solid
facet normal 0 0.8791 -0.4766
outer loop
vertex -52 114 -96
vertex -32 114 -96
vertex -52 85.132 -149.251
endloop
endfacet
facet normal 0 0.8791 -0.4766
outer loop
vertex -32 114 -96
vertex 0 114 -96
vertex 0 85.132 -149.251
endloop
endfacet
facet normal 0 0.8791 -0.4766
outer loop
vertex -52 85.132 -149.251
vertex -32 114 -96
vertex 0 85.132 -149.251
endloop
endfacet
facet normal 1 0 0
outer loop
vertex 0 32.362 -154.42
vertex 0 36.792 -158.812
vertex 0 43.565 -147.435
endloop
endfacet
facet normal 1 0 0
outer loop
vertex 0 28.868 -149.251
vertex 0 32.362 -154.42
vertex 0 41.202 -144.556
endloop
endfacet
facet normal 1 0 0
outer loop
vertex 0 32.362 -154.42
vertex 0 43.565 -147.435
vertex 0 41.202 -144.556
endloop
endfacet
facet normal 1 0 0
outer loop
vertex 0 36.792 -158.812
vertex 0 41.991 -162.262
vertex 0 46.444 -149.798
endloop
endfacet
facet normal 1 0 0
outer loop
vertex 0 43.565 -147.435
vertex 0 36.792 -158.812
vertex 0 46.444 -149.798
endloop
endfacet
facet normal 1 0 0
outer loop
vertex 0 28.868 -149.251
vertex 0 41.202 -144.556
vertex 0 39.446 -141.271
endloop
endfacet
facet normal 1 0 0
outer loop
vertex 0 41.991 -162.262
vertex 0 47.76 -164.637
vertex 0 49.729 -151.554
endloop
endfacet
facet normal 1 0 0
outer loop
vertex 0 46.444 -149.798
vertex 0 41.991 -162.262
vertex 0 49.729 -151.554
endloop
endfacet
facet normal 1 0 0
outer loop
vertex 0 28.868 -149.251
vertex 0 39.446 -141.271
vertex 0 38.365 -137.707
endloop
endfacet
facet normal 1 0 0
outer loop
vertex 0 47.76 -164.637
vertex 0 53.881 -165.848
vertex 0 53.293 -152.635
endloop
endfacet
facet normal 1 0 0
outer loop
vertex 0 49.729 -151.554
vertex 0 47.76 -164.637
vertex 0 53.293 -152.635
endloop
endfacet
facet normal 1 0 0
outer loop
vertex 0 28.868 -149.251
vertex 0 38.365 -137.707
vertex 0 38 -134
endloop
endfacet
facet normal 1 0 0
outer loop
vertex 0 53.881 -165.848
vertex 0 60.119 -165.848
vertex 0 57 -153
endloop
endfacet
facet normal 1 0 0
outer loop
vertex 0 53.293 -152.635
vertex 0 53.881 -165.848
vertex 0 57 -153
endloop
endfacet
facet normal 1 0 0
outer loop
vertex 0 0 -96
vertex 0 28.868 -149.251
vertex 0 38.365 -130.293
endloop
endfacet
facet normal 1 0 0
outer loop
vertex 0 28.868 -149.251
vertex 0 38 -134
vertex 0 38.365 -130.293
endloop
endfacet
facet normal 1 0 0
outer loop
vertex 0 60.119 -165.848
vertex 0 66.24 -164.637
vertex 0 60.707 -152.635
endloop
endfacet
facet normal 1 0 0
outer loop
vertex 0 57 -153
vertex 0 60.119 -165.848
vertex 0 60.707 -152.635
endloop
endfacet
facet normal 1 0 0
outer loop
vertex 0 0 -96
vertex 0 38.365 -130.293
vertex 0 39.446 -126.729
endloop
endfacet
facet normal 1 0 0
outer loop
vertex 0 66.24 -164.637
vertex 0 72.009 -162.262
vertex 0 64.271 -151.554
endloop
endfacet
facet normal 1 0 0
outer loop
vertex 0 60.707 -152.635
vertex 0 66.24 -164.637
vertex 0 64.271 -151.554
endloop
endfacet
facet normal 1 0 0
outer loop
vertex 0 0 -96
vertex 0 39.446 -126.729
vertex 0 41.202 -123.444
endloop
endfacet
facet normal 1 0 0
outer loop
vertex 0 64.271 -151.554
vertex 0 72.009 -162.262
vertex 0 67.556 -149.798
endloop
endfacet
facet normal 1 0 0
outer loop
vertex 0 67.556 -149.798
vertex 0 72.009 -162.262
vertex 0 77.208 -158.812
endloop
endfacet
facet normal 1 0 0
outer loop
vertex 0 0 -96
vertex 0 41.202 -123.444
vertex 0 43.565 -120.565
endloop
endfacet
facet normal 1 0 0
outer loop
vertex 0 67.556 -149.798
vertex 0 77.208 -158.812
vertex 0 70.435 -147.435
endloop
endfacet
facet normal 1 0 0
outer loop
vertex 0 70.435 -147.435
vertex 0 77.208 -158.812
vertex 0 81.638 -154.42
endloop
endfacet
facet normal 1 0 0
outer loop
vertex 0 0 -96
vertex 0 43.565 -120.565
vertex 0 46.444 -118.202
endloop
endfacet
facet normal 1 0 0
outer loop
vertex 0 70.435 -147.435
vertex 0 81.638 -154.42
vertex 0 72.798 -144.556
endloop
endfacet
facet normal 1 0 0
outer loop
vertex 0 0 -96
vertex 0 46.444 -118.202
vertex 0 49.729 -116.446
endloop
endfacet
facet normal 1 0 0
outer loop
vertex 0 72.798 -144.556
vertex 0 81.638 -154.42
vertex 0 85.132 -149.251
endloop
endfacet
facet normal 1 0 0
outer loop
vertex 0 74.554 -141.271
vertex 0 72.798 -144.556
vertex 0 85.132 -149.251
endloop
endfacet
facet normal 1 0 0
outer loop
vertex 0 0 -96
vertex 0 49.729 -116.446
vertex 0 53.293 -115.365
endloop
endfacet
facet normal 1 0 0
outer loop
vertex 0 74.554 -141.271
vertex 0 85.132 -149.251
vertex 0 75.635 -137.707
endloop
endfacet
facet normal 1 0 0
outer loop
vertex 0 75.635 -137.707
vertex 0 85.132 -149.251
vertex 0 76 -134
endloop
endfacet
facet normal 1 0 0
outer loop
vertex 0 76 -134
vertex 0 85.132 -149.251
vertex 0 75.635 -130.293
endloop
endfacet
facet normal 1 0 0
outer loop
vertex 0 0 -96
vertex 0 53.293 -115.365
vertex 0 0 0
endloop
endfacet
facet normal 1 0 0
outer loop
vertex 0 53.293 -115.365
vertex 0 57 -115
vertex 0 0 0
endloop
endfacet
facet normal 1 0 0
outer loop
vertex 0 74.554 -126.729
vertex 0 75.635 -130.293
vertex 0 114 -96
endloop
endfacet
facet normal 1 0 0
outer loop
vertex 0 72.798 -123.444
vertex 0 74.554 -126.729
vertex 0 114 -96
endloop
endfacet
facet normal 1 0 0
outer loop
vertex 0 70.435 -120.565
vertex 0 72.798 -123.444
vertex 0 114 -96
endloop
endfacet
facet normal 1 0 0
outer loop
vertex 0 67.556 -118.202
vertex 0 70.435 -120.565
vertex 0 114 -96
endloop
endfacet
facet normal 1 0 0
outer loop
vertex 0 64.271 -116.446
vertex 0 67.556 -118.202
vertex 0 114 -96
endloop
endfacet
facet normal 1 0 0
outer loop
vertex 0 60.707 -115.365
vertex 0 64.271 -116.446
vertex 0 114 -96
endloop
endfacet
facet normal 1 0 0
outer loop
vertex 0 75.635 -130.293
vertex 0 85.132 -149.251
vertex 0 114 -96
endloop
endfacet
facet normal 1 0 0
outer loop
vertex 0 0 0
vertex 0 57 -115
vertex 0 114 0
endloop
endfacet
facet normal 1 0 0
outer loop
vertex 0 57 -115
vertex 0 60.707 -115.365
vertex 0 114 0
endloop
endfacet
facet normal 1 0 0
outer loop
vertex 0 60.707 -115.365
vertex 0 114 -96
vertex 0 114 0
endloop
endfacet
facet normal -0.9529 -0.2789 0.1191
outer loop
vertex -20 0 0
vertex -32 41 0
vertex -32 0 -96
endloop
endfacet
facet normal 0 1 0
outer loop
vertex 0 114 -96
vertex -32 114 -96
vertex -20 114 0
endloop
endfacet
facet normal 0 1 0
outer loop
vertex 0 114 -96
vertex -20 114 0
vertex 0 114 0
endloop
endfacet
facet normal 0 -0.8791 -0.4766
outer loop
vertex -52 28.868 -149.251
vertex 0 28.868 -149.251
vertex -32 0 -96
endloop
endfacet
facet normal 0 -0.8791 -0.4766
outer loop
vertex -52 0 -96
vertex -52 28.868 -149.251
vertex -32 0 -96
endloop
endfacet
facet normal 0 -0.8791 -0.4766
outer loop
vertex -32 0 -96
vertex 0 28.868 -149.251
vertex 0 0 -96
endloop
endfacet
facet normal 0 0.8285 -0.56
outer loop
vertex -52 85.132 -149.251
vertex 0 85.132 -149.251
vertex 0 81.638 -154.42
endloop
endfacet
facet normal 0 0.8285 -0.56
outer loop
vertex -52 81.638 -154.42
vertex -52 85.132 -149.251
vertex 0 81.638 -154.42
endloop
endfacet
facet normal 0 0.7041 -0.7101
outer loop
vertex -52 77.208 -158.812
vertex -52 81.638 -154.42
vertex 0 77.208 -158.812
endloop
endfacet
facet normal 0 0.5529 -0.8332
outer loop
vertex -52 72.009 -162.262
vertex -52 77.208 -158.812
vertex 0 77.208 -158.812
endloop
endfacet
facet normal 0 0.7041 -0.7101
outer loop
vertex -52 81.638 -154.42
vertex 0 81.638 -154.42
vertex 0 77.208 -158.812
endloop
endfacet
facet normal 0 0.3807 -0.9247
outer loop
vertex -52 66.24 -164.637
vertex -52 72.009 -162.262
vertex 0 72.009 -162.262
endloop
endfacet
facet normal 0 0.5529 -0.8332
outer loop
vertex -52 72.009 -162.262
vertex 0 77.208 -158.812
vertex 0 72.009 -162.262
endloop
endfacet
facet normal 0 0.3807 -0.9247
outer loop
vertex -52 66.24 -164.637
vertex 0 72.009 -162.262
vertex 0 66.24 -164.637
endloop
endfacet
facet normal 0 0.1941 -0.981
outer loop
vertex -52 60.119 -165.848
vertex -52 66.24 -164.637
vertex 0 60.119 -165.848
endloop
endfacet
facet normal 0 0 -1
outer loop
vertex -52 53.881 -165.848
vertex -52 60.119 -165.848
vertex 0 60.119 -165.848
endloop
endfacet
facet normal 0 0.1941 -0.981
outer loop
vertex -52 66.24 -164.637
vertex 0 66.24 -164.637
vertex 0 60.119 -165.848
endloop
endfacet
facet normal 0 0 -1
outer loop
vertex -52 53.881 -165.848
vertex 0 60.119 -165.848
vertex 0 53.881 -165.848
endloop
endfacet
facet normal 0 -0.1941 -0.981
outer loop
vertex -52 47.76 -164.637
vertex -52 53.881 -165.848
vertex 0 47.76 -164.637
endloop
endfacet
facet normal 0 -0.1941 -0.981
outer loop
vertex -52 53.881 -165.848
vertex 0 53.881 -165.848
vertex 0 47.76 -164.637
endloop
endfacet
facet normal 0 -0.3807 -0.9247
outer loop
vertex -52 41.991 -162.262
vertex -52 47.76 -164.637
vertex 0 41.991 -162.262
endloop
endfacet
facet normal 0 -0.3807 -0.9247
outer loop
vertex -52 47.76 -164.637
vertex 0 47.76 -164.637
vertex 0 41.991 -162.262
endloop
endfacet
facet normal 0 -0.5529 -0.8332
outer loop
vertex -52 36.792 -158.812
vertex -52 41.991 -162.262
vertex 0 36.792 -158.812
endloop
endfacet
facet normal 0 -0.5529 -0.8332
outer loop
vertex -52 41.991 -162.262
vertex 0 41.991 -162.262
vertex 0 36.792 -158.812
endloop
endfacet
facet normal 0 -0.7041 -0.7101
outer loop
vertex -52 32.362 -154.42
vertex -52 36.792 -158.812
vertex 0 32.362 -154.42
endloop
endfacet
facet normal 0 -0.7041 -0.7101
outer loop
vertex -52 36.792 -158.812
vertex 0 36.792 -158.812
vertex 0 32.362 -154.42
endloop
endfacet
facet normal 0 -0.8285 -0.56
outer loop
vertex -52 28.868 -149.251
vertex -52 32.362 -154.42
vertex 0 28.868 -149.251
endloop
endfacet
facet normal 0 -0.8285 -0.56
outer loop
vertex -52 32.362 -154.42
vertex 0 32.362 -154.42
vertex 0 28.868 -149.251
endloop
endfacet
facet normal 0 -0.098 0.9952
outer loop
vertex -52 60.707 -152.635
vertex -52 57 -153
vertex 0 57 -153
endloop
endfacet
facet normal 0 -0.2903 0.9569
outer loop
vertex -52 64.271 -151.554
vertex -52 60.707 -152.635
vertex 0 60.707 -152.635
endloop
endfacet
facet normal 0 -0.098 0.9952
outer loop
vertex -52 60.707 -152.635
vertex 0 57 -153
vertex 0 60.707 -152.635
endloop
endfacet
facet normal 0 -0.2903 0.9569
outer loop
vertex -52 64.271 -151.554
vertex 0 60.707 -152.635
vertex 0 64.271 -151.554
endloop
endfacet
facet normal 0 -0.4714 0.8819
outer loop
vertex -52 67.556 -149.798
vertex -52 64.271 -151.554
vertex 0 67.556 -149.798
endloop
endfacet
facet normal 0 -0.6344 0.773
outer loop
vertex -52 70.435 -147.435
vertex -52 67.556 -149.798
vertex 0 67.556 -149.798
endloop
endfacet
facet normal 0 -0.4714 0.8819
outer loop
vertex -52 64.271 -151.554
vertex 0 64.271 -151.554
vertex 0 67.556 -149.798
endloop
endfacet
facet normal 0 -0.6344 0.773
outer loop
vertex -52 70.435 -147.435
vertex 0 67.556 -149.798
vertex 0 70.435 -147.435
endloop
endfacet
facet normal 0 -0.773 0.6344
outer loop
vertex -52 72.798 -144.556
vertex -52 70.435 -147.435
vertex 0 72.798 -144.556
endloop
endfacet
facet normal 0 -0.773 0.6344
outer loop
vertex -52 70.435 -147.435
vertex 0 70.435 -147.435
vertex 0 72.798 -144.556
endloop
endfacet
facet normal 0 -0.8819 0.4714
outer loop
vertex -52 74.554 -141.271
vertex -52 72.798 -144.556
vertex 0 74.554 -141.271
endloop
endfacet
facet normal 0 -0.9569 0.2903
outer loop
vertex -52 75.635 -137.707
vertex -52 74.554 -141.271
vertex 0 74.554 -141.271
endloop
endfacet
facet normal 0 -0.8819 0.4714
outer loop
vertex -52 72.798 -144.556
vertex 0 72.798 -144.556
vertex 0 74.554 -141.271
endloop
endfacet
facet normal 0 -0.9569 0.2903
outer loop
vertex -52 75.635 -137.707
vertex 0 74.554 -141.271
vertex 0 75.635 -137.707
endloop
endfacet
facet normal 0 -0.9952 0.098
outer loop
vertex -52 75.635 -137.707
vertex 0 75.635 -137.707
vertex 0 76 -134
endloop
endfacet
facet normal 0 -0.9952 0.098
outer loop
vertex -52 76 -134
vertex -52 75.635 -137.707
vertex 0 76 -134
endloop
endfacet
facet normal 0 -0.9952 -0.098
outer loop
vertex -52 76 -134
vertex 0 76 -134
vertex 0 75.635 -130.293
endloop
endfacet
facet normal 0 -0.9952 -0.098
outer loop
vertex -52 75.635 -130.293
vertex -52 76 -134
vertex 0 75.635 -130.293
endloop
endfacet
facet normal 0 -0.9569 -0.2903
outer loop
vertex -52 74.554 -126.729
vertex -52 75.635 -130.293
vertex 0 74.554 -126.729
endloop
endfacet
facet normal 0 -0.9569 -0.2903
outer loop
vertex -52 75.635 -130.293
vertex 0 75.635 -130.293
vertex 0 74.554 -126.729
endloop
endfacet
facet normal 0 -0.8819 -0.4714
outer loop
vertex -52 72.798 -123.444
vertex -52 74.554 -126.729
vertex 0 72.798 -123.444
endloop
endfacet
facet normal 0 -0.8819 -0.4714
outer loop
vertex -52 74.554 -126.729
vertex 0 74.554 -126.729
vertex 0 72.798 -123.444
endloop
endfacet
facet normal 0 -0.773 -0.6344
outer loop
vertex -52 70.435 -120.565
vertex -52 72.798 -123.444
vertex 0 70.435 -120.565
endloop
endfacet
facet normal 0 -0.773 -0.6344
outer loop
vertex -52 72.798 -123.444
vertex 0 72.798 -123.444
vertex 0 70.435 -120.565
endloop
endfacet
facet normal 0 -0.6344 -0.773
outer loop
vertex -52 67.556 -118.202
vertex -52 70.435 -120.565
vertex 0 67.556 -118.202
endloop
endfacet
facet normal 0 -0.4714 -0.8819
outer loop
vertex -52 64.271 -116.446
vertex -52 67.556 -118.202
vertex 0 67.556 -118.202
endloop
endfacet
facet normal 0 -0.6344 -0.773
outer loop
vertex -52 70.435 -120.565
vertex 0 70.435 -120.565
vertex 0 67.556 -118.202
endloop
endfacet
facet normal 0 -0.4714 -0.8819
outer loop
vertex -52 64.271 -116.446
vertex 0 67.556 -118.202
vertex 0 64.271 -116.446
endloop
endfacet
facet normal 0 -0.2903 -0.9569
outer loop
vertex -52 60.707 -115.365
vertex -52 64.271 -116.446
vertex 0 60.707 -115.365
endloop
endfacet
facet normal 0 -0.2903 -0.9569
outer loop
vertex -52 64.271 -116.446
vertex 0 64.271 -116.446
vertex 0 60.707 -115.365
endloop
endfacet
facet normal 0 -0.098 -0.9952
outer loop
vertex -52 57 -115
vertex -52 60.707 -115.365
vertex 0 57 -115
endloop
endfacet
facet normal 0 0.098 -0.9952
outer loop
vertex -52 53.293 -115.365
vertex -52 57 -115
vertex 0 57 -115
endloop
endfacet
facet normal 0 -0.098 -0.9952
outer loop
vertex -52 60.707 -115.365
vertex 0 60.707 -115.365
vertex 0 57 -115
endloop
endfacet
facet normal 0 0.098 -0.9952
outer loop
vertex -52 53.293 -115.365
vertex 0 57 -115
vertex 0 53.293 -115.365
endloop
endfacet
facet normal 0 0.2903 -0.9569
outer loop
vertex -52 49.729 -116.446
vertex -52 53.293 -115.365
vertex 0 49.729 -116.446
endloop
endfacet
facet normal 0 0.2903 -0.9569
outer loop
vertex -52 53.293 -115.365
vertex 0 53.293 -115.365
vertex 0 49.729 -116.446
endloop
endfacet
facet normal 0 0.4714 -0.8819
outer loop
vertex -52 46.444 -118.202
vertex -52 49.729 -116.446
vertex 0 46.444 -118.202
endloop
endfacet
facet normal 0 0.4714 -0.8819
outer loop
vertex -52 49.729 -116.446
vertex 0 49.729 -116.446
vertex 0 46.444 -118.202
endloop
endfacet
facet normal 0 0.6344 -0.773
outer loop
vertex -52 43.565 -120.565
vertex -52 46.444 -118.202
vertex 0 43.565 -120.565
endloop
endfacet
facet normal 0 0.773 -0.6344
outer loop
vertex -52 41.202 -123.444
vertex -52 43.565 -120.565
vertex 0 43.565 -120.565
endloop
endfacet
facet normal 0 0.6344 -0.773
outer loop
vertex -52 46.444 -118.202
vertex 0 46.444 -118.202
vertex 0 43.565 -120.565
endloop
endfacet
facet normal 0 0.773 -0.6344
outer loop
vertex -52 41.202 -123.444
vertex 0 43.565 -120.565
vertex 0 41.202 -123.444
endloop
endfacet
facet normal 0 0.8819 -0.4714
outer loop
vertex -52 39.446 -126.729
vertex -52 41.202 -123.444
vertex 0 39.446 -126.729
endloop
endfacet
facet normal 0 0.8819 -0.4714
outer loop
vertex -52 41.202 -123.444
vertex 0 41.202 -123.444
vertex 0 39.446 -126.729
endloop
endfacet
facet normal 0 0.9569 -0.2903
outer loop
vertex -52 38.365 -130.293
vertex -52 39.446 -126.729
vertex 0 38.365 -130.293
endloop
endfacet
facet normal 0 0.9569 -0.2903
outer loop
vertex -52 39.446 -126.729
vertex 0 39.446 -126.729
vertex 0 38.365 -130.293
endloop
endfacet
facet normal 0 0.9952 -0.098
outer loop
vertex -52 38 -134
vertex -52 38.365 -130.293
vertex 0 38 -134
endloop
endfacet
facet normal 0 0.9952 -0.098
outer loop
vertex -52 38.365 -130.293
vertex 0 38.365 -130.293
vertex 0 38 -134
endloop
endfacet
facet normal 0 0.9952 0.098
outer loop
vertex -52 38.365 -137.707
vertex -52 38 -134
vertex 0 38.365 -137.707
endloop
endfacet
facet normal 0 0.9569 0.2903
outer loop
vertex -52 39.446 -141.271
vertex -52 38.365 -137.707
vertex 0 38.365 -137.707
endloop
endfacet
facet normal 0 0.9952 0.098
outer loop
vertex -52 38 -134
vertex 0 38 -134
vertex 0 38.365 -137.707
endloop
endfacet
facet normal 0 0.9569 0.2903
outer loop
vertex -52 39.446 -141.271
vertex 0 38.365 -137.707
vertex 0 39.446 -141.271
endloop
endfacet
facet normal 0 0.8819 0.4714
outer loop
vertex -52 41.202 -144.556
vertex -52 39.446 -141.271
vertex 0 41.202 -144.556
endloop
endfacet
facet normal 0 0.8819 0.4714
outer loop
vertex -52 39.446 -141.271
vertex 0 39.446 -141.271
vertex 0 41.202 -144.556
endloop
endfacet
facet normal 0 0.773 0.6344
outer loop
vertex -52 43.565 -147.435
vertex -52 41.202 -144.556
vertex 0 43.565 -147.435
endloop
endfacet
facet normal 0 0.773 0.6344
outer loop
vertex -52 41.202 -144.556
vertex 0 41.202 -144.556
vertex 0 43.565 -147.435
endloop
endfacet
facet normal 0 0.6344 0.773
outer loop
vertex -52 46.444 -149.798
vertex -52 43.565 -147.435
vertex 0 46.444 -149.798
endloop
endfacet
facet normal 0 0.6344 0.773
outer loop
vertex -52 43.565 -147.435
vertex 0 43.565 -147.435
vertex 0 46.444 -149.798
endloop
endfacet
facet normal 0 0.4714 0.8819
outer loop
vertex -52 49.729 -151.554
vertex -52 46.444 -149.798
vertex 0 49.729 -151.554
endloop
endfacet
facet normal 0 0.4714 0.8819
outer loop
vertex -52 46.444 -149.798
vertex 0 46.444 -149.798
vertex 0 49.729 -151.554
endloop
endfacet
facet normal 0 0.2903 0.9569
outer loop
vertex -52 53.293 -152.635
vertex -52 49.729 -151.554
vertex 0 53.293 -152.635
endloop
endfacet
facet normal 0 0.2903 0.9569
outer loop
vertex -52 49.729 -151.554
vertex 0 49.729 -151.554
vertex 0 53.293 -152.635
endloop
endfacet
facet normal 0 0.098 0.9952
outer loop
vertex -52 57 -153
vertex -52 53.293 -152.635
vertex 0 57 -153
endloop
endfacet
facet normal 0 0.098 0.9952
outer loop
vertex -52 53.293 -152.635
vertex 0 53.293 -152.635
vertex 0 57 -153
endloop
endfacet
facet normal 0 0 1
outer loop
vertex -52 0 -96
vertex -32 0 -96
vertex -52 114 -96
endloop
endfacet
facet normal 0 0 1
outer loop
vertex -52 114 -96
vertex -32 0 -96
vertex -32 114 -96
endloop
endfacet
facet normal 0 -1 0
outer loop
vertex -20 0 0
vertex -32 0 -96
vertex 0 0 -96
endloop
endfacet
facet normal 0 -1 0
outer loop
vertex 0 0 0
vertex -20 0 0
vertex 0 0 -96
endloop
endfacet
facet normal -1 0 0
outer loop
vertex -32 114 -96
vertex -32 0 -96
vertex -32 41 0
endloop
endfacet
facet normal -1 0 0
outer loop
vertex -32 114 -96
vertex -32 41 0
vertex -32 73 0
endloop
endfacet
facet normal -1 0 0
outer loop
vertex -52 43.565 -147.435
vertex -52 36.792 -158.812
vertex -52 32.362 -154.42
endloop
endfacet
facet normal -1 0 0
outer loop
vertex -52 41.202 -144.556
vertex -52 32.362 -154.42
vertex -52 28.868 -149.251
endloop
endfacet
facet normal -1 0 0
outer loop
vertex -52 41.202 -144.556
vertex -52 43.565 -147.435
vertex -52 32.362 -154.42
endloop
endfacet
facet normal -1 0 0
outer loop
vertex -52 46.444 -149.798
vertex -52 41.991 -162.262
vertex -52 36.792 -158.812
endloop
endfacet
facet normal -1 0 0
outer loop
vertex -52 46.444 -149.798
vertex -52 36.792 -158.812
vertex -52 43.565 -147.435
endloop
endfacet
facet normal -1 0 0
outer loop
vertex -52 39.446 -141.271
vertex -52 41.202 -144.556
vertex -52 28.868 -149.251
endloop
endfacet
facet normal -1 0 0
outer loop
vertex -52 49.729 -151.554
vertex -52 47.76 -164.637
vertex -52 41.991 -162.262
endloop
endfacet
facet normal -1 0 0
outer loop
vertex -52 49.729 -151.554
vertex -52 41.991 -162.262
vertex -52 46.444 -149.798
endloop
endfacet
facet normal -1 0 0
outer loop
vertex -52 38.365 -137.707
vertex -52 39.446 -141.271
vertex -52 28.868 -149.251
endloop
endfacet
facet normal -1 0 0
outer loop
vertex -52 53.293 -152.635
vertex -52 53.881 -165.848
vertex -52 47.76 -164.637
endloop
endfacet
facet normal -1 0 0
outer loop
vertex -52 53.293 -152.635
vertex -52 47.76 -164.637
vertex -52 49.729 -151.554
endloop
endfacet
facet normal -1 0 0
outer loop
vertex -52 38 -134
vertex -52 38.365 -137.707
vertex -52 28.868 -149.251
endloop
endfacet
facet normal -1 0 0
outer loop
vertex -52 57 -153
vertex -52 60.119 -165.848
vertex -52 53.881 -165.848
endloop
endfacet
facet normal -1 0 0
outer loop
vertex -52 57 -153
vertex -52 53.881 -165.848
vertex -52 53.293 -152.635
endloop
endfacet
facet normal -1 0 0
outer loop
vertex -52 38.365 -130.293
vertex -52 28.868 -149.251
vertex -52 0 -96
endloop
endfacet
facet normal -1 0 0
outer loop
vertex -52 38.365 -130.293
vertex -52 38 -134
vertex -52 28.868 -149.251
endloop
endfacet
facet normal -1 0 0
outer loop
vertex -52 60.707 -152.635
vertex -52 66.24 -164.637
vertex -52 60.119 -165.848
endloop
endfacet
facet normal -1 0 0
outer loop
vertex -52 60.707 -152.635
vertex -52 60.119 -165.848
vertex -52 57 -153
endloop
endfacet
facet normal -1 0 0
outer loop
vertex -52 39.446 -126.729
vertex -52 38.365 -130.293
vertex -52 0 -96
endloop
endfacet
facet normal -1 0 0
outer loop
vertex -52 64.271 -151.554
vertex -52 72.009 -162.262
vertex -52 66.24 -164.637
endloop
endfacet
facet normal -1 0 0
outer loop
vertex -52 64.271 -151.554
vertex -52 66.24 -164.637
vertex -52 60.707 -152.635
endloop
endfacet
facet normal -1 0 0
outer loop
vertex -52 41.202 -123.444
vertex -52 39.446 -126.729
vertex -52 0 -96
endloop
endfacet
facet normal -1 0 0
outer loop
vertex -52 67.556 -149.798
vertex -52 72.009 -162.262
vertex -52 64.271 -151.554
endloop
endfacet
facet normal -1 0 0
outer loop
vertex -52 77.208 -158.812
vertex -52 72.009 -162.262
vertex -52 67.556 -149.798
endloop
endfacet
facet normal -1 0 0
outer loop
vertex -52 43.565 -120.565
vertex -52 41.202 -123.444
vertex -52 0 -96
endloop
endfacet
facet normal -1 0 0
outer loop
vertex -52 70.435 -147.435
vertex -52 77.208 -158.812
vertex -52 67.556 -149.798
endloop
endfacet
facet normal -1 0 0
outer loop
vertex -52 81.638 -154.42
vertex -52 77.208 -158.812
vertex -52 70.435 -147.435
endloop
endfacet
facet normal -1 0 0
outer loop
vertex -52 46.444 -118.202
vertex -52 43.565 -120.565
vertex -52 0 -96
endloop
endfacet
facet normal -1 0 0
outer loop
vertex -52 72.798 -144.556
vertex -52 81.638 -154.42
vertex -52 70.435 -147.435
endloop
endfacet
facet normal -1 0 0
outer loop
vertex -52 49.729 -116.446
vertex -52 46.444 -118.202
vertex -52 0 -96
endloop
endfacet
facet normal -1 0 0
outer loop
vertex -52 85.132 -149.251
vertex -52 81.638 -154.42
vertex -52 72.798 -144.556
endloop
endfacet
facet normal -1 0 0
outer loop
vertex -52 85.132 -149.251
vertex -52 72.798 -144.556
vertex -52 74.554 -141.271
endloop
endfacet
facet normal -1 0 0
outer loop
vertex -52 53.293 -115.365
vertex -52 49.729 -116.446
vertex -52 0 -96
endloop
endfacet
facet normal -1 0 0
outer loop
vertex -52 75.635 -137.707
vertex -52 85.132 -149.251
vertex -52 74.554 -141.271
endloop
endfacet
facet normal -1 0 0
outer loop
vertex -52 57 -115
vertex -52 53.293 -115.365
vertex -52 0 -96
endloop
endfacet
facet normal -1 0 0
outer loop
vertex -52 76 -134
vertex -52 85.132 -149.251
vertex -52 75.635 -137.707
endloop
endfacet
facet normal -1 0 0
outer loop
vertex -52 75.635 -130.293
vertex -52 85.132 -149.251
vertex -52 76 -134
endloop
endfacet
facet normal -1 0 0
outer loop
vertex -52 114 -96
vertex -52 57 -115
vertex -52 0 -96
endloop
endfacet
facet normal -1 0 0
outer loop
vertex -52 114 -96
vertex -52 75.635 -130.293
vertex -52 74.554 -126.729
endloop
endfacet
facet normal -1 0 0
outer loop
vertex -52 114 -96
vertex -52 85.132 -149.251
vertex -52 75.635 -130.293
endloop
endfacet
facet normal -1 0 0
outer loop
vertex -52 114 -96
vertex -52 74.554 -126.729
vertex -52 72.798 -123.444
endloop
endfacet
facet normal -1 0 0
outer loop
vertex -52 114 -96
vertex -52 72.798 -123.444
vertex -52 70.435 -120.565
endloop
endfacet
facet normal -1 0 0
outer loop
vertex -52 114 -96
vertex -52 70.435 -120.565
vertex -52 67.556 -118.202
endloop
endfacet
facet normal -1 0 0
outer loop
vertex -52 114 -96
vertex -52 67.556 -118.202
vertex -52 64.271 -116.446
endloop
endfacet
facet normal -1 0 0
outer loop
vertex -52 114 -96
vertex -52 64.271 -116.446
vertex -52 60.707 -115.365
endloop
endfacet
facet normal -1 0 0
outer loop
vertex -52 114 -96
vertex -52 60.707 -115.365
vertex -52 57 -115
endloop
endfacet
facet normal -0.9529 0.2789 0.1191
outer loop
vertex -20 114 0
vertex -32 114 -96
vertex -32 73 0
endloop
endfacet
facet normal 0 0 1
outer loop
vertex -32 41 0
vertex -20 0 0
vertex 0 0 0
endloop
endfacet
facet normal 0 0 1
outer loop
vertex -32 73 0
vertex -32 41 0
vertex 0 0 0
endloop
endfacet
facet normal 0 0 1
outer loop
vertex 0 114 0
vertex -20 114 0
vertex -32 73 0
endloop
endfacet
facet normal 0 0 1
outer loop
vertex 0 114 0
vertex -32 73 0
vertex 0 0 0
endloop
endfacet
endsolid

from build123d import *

# Parameters (mm, degrees)
SKETCH1_W           = 32
SKETCH1_H           = 114
BOSS_EXTRUDE1_DEPTH = 96
CUT_EXTRUDE1_REACH  = 157.637
CUT_EXTRUDE2_REACH  = 152.756
SKETCH8_R           = 19
BOSS_EXTRUDE2_DEPTH = 52


with BuildPart() as part:
    # Sketch1 → Boss-Extrude1 (new body)
    with BuildSketch(Plane.XY):
        with Locations((-16, 57)):
            Rectangle(SKETCH1_W, SKETCH1_H)
    extrude(amount=-BOSS_EXTRUDE1_DEPTH)

    # Sketch4 → Cut-Extrude1 (cut, up to next)
    with BuildSketch(Plane(origin=(-18.160548949, -5.315282619, 2.270068619), x_dir=(0.11431729078371765, 0.033458719253771, 0.9928806933029609), z_dir=(-0.9529047420591578, -0.27889894889536315, 0.11911309275739475)), mode=Mode.PRIVATE) as cut_extrude1_sk1:
        Polygon((-98.974699862, 8.988760105), (-2.286345816, 48.337993792), (-2.286345816, 5.617975065), align=None)
    cut_extrude1_tool1 = extrude(cut_extrude1_sk1.sketch, amount=CUT_EXTRUDE1_REACH, mode=Mode.PRIVATE) & part.part
    add(cut_extrude1_tool1.solids().sort_by_distance((-28, 13.666667, -32))[0], mode=Mode.SUBTRACT)

    # Sketch3 → Cut-Extrude2 (cut, up to next)
    with BuildSketch(Plane(origin=(-48.457659878, 14.18272972, 6.057207485), x_dir=(0.11431729078371765, -0.033458719253771, 0.9928806933029609), z_dir=(-0.9529047420591578, 0.27889894889536315, 0.11911309275739475)), mode=Mode.PRIVATE) as cut_extrude2_sk1:
        Polygon((-6.100639811, 61.072070607), (-6.100639811, 103.792089334), (-102.788993857, 100.421304294), align=None)
    cut_extrude2_tool1 = extrude(cut_extrude2_sk1.sketch, amount=CUT_EXTRUDE2_REACH, mode=Mode.PRIVATE) & part.part
    add(cut_extrude2_tool1.solids().sort_by_distance((-28, 100.333333, -32))[0], mode=Mode.SUBTRACT)

    # Sketch8 → Boss-Extrude2 (add)
    with BuildSketch(Plane(origin=(0, 0, 0), x_dir=(0, 0, -1), z_dir=(1, 0, 0))):
        with BuildLine():
            Line((96, 114), (149.250761153, 85.132086383))
            ThreePointArc((149.250761153, 85.132086383), (166, 57), (149.250761153, 28.867913617))
            Line((149.250761153, 28.867913617), (96, 0))
            Line((96, 0), (96, 114))
        make_face()
        with Locations((134, 57)):
            Circle(SKETCH8_R, mode=Mode.SUBTRACT)
    extrude(amount=-BOSS_EXTRUDE2_DEPTH)


solid = part.part
